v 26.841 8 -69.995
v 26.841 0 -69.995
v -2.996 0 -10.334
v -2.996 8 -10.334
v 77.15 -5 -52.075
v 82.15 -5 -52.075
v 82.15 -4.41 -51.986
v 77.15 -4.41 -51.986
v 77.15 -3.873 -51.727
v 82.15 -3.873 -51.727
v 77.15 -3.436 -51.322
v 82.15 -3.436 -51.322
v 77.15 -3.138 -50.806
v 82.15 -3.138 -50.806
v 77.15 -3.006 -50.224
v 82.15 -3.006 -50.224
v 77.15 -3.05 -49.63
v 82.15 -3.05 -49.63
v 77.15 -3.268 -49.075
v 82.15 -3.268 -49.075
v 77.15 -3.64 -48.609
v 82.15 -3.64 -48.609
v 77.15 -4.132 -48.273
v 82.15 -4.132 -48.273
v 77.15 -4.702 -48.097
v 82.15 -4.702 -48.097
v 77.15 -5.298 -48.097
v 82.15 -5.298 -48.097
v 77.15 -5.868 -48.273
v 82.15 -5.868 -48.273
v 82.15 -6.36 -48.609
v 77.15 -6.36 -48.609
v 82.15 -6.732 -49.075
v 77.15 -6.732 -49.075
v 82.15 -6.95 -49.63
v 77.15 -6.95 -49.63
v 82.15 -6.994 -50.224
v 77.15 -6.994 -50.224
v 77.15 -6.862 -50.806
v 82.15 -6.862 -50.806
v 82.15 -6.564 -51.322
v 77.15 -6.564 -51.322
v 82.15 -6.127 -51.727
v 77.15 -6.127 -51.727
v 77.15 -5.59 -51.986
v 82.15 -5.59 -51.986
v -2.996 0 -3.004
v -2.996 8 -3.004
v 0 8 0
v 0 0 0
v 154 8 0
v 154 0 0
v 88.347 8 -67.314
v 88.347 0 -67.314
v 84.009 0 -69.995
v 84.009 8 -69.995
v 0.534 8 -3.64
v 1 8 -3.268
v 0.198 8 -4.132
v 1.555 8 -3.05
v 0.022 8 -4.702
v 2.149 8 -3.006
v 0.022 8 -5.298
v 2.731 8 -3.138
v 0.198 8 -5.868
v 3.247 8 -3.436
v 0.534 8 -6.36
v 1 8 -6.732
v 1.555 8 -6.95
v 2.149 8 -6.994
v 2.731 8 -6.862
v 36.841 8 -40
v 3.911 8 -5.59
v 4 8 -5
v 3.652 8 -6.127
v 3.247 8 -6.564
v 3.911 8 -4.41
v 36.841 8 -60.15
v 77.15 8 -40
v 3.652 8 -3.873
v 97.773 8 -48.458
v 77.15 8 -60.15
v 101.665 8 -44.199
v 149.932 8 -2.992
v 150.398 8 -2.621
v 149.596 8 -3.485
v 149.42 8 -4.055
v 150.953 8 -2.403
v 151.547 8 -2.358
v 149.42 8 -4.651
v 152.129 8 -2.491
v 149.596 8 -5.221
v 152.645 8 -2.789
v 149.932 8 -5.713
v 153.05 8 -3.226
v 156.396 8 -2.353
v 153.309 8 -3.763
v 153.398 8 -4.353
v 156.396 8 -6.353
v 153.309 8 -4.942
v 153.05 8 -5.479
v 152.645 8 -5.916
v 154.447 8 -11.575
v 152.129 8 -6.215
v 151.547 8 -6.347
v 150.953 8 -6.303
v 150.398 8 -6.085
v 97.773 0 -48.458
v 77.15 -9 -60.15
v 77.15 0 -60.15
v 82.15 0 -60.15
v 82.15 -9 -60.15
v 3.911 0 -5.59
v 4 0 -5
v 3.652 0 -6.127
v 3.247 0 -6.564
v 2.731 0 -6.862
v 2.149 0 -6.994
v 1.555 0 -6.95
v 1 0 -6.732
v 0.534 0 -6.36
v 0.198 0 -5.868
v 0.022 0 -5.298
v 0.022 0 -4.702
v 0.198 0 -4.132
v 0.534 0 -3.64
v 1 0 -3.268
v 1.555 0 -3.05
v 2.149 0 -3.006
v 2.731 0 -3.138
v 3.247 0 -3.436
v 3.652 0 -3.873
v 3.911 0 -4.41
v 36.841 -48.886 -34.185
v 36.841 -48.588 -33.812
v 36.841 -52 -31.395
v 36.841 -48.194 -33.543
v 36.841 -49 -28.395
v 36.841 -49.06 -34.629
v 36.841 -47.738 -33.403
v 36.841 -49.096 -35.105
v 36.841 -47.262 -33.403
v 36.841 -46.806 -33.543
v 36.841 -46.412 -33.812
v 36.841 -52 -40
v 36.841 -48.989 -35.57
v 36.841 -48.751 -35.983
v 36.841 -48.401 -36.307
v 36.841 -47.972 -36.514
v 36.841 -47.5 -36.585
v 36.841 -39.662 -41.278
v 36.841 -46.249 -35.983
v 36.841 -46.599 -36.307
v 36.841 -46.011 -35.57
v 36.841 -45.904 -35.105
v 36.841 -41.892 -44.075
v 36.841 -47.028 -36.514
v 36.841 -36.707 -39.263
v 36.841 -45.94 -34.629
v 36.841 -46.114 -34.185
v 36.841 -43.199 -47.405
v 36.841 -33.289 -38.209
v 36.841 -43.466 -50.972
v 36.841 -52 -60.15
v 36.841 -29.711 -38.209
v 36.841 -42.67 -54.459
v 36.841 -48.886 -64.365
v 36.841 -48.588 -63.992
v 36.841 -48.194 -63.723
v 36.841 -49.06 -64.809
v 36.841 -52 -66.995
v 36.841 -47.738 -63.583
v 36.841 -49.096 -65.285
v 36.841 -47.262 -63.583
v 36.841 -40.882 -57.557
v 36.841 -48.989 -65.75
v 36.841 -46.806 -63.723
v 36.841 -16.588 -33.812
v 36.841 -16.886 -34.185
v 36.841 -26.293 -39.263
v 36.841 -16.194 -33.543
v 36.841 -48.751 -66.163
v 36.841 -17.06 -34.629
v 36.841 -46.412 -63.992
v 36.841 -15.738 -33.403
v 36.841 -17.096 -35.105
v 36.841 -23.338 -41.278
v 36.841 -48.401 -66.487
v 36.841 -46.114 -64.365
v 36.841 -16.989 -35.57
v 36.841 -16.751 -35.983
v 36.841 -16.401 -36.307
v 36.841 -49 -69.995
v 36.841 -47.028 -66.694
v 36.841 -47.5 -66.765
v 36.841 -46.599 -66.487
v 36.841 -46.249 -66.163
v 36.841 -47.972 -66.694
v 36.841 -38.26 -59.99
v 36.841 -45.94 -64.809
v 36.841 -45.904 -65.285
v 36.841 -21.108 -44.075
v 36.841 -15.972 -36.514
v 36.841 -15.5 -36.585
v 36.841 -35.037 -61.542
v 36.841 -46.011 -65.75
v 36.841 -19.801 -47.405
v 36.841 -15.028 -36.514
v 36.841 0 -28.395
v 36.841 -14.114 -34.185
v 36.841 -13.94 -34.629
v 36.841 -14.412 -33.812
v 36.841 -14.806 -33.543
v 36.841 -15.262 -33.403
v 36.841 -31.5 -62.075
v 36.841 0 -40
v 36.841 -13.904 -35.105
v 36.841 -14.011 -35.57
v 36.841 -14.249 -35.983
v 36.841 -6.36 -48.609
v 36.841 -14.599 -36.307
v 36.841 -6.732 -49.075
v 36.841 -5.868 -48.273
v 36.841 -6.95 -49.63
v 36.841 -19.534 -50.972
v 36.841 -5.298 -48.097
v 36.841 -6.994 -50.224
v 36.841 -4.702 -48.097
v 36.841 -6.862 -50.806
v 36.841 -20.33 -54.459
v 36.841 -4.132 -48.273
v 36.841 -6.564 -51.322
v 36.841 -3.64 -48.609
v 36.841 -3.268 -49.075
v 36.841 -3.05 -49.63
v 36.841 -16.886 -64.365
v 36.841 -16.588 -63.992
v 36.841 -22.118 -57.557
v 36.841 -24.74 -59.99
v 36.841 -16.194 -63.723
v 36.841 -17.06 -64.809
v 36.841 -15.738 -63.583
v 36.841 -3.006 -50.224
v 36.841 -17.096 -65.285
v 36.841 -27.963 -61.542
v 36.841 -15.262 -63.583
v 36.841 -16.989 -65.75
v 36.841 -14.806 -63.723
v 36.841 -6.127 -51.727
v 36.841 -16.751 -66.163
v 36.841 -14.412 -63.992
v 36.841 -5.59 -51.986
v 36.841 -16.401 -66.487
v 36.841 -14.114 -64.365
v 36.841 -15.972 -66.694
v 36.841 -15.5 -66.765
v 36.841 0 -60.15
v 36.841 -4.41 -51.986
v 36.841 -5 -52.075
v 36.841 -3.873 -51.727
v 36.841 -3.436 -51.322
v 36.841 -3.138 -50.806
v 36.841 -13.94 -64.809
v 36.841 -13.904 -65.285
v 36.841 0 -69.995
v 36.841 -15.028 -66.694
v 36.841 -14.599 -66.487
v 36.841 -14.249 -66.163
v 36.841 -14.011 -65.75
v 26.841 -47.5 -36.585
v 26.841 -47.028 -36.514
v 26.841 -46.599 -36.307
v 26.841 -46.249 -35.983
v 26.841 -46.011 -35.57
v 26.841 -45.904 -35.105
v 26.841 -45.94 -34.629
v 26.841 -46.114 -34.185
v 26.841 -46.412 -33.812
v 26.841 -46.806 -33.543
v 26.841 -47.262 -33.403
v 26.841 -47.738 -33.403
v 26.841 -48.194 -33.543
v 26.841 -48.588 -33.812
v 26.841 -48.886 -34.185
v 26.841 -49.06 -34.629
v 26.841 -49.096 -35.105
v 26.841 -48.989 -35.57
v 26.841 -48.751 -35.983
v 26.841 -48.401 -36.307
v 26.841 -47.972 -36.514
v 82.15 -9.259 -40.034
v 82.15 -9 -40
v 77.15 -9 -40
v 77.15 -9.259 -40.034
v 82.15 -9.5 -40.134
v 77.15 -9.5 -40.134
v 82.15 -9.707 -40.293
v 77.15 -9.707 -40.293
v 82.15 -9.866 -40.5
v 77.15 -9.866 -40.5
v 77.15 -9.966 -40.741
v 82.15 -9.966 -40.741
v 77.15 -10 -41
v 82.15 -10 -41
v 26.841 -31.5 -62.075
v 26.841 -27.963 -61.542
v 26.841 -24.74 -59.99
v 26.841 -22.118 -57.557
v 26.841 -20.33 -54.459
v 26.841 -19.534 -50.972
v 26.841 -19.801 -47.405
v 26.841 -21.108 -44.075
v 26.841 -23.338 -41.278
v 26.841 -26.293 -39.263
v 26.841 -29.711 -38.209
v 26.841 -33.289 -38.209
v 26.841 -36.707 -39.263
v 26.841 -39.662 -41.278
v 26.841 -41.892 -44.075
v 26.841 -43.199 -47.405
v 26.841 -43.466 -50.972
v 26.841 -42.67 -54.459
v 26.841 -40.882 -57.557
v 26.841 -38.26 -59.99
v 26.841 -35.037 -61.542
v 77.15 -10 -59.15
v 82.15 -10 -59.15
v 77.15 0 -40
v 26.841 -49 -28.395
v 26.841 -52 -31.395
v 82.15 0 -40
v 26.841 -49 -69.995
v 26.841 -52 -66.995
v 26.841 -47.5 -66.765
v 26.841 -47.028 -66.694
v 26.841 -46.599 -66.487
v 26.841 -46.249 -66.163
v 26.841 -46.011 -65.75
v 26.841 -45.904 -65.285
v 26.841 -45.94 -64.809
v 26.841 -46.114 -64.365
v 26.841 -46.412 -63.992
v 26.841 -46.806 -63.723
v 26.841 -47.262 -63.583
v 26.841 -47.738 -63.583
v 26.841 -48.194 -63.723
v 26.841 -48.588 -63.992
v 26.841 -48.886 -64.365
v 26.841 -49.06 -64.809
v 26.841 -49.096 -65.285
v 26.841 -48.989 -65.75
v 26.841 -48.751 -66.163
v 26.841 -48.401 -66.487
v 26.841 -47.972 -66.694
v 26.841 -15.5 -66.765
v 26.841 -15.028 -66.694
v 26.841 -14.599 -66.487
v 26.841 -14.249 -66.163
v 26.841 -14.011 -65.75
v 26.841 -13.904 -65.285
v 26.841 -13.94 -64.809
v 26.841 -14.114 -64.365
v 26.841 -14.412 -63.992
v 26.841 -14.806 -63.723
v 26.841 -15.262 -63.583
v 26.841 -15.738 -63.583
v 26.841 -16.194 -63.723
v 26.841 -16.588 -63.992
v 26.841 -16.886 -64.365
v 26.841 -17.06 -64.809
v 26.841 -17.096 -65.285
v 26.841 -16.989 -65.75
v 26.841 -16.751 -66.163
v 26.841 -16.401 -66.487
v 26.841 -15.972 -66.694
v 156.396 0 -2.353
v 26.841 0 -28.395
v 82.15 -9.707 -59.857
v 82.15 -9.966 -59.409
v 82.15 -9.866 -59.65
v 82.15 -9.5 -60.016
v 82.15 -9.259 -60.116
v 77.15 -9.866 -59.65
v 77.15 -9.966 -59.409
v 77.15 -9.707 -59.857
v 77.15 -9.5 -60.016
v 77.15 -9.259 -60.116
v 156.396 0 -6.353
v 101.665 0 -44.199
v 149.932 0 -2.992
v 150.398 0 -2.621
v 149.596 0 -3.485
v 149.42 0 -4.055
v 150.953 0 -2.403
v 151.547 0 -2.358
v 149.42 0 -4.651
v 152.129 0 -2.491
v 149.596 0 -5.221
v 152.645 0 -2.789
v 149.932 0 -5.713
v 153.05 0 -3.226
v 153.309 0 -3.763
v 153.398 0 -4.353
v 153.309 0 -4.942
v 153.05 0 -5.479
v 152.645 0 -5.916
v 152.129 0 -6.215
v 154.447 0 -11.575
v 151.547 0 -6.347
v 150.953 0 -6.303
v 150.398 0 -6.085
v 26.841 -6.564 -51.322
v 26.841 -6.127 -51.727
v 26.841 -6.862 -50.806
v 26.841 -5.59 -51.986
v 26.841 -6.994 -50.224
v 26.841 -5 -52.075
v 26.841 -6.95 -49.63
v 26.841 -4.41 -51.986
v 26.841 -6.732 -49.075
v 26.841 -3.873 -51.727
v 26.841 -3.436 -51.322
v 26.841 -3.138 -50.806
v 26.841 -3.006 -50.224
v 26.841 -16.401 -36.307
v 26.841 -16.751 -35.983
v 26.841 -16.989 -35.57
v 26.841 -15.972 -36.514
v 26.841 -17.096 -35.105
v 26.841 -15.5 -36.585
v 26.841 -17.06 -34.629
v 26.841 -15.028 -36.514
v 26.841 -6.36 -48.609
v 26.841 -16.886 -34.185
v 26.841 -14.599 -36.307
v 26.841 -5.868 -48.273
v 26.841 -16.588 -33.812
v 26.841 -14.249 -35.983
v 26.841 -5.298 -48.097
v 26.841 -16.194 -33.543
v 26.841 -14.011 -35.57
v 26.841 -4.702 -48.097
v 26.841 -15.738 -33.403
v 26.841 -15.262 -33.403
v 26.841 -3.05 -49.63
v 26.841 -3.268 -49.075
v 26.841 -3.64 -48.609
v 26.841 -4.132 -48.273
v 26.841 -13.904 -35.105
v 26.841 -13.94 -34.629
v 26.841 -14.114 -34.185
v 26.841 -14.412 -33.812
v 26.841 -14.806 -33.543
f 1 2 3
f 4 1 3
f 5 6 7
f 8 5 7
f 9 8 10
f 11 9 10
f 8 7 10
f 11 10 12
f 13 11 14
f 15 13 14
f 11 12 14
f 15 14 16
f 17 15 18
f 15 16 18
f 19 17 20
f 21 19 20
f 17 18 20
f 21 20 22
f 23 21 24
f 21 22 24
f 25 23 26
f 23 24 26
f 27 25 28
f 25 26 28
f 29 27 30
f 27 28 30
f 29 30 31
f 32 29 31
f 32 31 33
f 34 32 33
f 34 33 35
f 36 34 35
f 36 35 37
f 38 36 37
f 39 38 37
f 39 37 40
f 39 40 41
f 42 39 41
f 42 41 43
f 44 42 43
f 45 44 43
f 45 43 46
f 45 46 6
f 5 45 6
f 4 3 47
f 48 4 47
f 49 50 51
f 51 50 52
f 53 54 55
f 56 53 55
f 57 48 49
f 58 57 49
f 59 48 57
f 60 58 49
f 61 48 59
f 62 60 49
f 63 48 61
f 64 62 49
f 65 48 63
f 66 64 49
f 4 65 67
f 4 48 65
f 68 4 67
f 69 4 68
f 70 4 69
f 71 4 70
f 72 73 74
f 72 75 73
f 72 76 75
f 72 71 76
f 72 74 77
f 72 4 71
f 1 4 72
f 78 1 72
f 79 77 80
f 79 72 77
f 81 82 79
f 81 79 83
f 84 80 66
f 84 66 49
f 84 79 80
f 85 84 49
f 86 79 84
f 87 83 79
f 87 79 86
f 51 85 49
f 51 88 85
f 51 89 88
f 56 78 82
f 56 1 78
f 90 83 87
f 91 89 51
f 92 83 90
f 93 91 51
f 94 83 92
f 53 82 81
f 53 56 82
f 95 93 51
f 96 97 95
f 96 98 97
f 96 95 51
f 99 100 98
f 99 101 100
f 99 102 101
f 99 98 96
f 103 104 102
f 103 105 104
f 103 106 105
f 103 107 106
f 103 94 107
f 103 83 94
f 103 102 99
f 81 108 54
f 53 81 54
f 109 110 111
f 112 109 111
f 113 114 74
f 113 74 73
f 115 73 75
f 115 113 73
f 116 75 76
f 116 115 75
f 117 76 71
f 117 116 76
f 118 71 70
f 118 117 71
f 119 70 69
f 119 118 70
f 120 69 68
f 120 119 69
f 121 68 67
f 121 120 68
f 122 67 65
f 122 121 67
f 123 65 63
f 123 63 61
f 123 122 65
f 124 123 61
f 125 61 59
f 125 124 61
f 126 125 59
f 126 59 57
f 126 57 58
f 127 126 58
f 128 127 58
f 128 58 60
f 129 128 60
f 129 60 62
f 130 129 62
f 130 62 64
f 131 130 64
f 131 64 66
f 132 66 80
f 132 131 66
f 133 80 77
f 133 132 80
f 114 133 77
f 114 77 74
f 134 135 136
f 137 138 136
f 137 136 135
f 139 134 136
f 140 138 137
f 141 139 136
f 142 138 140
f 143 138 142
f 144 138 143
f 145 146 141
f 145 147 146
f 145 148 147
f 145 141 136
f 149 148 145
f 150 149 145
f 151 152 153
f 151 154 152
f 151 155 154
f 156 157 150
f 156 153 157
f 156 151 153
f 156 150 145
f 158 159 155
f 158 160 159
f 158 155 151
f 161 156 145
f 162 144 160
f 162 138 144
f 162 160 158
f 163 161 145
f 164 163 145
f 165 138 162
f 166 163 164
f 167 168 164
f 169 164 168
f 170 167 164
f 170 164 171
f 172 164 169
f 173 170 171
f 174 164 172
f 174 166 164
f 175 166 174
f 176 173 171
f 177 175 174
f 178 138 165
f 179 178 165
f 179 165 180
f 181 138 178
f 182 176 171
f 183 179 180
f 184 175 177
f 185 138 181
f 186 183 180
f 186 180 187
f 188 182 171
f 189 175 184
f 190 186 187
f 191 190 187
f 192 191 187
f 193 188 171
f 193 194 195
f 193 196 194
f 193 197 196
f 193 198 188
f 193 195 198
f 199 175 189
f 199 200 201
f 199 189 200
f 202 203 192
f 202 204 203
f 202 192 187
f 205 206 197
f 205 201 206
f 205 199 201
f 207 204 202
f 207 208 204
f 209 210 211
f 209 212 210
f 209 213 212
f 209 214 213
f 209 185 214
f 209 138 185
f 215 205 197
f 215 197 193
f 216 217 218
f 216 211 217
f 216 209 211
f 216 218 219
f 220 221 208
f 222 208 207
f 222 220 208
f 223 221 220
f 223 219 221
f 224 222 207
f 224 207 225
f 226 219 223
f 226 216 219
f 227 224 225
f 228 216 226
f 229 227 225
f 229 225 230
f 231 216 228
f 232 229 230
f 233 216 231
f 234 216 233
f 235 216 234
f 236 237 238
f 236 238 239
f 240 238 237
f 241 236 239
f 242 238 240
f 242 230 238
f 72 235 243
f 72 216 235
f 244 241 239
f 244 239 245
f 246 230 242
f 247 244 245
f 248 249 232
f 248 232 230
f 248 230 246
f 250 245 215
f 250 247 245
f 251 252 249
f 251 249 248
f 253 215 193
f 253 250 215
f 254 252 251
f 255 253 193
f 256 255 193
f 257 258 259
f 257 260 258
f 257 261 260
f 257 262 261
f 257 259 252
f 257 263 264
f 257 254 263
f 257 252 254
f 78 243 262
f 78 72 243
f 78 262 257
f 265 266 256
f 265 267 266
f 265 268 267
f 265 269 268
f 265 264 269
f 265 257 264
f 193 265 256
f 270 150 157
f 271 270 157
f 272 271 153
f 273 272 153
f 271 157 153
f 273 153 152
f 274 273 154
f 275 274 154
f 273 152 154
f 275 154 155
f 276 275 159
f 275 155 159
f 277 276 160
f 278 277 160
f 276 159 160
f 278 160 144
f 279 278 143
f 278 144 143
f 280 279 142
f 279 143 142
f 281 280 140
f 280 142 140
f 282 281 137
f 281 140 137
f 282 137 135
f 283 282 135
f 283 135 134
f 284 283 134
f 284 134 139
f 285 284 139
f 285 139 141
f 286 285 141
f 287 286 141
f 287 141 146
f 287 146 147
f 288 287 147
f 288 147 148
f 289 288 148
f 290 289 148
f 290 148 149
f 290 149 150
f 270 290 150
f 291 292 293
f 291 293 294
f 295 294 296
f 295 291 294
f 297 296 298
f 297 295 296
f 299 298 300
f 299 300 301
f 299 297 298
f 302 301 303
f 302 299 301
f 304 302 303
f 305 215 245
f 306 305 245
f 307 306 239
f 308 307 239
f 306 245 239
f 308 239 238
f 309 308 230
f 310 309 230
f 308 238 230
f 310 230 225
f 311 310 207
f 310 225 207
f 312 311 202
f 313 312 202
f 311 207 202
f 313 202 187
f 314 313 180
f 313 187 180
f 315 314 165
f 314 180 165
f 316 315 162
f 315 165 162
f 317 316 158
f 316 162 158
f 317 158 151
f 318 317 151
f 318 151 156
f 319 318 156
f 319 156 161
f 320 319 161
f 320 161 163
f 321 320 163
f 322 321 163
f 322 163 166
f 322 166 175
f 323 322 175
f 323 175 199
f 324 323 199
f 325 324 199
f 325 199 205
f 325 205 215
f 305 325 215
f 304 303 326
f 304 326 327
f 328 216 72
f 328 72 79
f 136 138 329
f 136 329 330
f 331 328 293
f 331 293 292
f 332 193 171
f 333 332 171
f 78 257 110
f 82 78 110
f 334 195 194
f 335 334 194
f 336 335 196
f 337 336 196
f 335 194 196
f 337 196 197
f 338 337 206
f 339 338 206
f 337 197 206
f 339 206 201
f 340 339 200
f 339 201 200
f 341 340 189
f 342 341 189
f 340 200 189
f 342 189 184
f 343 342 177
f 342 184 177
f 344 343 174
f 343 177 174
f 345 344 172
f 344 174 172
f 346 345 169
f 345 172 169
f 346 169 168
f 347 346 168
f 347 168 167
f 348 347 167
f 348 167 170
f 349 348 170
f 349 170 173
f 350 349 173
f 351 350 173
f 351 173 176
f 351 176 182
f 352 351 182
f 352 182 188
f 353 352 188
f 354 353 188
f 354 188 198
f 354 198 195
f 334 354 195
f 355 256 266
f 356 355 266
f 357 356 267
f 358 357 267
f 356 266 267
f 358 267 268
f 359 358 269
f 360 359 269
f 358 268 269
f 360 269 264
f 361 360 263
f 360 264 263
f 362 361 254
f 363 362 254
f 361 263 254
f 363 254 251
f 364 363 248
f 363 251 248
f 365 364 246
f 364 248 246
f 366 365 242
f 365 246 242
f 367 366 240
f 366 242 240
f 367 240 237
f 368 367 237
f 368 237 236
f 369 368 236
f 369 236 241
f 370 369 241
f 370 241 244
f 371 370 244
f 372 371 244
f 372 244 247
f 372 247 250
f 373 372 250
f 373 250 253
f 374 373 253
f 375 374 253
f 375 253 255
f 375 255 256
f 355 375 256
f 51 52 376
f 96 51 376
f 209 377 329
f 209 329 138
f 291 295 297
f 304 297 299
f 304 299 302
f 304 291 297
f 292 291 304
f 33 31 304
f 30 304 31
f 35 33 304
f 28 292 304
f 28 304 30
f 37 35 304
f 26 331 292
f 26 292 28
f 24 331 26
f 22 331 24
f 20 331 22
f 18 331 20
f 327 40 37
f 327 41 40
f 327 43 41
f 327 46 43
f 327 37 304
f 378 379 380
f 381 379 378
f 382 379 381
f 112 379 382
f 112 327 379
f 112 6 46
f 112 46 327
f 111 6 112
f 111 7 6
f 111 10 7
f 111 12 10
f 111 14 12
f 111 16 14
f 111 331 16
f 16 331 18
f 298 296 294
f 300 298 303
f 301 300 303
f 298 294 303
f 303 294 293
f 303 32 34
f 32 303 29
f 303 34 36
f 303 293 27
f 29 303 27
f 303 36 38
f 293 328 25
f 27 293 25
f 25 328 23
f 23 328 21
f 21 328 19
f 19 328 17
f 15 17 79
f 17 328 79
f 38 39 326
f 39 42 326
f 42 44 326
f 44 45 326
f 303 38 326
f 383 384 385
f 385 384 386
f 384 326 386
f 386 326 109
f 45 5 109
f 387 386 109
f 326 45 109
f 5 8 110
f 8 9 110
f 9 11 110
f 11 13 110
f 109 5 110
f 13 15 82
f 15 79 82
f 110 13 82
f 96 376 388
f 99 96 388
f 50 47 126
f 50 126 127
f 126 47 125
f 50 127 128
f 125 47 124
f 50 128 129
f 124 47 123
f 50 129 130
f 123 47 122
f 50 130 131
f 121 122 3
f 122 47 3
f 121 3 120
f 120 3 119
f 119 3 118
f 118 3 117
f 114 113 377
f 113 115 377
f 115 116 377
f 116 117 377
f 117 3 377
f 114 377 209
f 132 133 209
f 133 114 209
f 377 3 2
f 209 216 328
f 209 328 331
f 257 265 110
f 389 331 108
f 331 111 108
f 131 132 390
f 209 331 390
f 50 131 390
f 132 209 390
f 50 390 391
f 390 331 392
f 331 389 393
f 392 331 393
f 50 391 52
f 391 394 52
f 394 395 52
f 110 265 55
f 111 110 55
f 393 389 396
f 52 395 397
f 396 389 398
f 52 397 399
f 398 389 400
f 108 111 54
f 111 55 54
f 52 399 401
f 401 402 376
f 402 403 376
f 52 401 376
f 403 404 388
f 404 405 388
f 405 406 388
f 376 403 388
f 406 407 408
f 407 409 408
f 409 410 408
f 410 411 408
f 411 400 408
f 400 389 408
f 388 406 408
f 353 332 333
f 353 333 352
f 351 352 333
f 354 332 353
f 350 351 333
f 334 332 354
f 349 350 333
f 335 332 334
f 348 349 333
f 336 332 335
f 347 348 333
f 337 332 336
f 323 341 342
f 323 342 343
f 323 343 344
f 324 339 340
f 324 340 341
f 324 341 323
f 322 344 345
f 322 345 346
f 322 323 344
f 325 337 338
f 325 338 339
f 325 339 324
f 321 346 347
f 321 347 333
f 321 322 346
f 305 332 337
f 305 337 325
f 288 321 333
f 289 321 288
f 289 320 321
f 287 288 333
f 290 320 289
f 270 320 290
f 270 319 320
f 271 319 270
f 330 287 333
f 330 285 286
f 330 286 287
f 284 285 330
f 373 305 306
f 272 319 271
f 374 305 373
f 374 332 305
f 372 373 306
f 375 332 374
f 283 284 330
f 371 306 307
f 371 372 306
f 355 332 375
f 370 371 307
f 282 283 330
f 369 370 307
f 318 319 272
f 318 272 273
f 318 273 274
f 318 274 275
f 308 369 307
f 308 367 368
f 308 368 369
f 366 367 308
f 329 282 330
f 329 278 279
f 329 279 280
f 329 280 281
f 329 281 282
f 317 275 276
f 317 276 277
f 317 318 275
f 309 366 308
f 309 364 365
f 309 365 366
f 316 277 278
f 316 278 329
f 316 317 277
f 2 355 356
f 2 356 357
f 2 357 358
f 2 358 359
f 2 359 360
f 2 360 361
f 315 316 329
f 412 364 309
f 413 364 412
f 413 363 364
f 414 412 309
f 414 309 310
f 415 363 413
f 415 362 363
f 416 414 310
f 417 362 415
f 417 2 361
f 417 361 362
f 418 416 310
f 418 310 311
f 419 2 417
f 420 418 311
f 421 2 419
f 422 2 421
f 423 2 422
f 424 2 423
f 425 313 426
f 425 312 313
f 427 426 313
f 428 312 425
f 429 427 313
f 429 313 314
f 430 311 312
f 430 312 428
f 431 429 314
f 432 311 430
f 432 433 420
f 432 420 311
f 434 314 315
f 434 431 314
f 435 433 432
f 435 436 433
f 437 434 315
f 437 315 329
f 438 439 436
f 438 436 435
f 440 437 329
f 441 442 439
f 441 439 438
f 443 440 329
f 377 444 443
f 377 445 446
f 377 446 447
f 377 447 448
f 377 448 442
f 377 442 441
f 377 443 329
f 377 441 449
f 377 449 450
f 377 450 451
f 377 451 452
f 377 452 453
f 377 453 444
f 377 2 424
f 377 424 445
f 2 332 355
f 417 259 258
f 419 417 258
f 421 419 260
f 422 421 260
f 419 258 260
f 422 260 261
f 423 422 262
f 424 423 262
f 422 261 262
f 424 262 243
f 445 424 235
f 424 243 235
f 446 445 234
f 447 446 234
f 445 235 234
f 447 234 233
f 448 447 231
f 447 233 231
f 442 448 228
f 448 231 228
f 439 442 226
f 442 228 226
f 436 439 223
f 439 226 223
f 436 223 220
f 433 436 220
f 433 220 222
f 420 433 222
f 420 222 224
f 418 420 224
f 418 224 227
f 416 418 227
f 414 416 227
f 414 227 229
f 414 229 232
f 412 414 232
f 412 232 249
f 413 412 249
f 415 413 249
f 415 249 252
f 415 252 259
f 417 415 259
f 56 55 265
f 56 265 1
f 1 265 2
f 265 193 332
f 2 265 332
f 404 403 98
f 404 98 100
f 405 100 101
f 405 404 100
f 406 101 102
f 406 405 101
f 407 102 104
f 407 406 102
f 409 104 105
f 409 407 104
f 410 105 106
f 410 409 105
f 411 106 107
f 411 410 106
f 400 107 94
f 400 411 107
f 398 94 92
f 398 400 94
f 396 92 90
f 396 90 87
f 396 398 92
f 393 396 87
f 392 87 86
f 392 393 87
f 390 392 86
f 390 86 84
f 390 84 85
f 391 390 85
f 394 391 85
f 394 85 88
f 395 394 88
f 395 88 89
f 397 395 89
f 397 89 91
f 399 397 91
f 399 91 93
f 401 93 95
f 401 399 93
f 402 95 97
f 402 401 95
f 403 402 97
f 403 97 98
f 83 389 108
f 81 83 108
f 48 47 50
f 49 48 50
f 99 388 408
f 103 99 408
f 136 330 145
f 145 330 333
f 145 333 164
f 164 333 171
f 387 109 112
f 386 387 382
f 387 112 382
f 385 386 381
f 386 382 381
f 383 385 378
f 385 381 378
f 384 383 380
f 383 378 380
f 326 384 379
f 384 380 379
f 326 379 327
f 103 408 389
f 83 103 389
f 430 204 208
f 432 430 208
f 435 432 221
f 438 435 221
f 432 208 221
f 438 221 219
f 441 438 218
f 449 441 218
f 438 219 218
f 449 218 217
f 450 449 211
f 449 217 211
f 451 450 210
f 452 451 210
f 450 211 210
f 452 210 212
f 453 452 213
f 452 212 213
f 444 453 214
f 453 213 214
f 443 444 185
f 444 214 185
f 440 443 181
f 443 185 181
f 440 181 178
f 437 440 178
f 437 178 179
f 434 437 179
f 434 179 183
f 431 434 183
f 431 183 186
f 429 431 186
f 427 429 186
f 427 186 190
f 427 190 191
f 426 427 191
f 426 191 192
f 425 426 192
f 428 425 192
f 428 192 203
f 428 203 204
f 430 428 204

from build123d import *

# Parameters (mm, degrees)
CROQUIS1_R              = 2
CROQUIS1_W              = 53.3
CROQUIS1_H              = 20.15
SALIENTE_EXTRUIR1_DEPTH = 8
CROQUIS2_W              = 10
CROQUIS2_H              = 41.6
SALIENTE_EXTRUIR2_DEPTH = 60
CROQUIS2_4_W            = 5
CROQUIS2_4_H            = 20.15
SALIENTE_EXTRUIR3_DEPTH = 18
CROQUIS3_R              = 2
CORTAR_EXTRUIR1_DEPTH   = 107
CROQUIS3_3_R            = 2
CORTAR_EXTRUIR2_DEPTH   = 8
CROQUIS5_R              = 1.6
CROQUIS5_R_2            = 12
CORTAR_EXTRUIR3_DEPTH   = 59


with BuildPart() as part:
    # Croquis1 → Saliente-Extruir1 (new body)
    with BuildSketch(Plane(origin=(0, 0, 0), x_dir=(1, 0, 0), z_dir=(0, 1, 0))):
        Polygon((154, 0), (156.396068252, 2.352828169), (156.396068252, 6.352828169), (154.446539538, 11.574918968), (101.665094886, 44.198861104), (97.772883017, 48.458390041), (88.347282669, 67.313746258), (84.009081739, 69.99516616), (26.841381739, 69.99516616), (-2.995601596, 10.334082852), (-2.995601596, 3.004082852), (0, 0), align=None)
        with Locations((2, 5)):
            Circle(CROQUIS1_R, mode=Mode.SUBTRACT)
        with Locations((151.397935499, 4.352828169)):
            Circle(CROQUIS1_R, mode=Mode.SUBTRACT)
        with Locations((55.5, 50.075)):
            Rectangle(CROQUIS1_W, CROQUIS1_H, mode=Mode.SUBTRACT)
    extrude(amount=SALIENTE_EXTRUIR1_DEPTH)

    # Croquis2 → Saliente-Extruir2 (add)
    with BuildSketch(Plane(origin=(0, 8, 0), x_dir=(1, 0, 0), z_dir=(0, 1, 0))):
        with Locations((31.841381739, 49.19516616)):
            Rectangle(CROQUIS2_W, CROQUIS2_H)
    extrude(amount=-SALIENTE_EXTRUIR2_DEPTH)

    # Croquis2<4> → Saliente-Extruir3 (add)
    with BuildSketch(Plane(origin=(0, 8, 0), x_dir=(1, 0, 0), z_dir=(0, 1, 0))):
        with Locations((79.65, 50.075)):
            Rectangle(CROQUIS2_4_W, CROQUIS2_4_H)
    extrude(amount=-SALIENTE_EXTRUIR3_DEPTH)

    # Croquis3 → Cortar-Extruir1 (cut)
    with BuildSketch(Plane(origin=(82.15, 0, 0), x_dir=(0, 0, -1), z_dir=(1, 0, 0))):
        with Locations((50.075, -5)):
            Circle(CROQUIS3_R)
    extrude(amount=-CORTAR_EXTRUIR1_DEPTH, mode=Mode.SUBTRACT)

    # Croquis3<3> → Cortar-Extruir2 (cut)
    with BuildSketch(Plane(origin=(82.15, 0, 0), x_dir=(0, 0, -1), z_dir=(1, 0, 0))):
        with Locations((50.075, -5)):
            Circle(CROQUIS3_3_R)
        with BuildLine():
            Line((59.15, -10), (60.15, -10))
            Line((60.15, -10), (60.15, -9))
            ThreePointArc((60.15, -9), (59.857106781, -9.707106781), (59.15, -10))
        make_face()
        with BuildLine():
            Line((40, -10), (40, -9))
            ThreePointArc((40, -9), (40.292893219, -9.707106781), (41, -10))
            Line((41, -10), (40, -10))
        make_face()
    extrude(amount=-CORTAR_EXTRUIR2_DEPTH, mode=Mode.SUBTRACT)

    # Croquis5 → Cortar-Extruir3 (cut)
    with BuildSketch(Plane(origin=(36.841381739, 0, 0), x_dir=(0, 0, -1), z_dir=(1, 0, 0))):
        with Locations((65.165, -15.5)):
            Circle(CROQUIS5_R)
        with Locations((50.075, -31.5)):
            Circle(CROQUIS5_R_2)
        with Locations((65.165, -47.5)):
            Circle(CROQUIS5_R)
        with Locations((34.985, -15.5)):
            Circle(CROQUIS5_R)
        with Locations((34.985, -47.5)):
            Circle(CROQUIS5_R)
        Polygon((28.39516616, -52), (28.39516616, -49), (31.39516616, -52), align=None)
        Polygon((69.99516616, -52), (69.99516616, -49), (66.99516616, -52), align=None)
    extrude(amount=-CORTAR_EXTRUIR3_DEPTH, mode=Mode.SUBTRACT)


solid = part.part
